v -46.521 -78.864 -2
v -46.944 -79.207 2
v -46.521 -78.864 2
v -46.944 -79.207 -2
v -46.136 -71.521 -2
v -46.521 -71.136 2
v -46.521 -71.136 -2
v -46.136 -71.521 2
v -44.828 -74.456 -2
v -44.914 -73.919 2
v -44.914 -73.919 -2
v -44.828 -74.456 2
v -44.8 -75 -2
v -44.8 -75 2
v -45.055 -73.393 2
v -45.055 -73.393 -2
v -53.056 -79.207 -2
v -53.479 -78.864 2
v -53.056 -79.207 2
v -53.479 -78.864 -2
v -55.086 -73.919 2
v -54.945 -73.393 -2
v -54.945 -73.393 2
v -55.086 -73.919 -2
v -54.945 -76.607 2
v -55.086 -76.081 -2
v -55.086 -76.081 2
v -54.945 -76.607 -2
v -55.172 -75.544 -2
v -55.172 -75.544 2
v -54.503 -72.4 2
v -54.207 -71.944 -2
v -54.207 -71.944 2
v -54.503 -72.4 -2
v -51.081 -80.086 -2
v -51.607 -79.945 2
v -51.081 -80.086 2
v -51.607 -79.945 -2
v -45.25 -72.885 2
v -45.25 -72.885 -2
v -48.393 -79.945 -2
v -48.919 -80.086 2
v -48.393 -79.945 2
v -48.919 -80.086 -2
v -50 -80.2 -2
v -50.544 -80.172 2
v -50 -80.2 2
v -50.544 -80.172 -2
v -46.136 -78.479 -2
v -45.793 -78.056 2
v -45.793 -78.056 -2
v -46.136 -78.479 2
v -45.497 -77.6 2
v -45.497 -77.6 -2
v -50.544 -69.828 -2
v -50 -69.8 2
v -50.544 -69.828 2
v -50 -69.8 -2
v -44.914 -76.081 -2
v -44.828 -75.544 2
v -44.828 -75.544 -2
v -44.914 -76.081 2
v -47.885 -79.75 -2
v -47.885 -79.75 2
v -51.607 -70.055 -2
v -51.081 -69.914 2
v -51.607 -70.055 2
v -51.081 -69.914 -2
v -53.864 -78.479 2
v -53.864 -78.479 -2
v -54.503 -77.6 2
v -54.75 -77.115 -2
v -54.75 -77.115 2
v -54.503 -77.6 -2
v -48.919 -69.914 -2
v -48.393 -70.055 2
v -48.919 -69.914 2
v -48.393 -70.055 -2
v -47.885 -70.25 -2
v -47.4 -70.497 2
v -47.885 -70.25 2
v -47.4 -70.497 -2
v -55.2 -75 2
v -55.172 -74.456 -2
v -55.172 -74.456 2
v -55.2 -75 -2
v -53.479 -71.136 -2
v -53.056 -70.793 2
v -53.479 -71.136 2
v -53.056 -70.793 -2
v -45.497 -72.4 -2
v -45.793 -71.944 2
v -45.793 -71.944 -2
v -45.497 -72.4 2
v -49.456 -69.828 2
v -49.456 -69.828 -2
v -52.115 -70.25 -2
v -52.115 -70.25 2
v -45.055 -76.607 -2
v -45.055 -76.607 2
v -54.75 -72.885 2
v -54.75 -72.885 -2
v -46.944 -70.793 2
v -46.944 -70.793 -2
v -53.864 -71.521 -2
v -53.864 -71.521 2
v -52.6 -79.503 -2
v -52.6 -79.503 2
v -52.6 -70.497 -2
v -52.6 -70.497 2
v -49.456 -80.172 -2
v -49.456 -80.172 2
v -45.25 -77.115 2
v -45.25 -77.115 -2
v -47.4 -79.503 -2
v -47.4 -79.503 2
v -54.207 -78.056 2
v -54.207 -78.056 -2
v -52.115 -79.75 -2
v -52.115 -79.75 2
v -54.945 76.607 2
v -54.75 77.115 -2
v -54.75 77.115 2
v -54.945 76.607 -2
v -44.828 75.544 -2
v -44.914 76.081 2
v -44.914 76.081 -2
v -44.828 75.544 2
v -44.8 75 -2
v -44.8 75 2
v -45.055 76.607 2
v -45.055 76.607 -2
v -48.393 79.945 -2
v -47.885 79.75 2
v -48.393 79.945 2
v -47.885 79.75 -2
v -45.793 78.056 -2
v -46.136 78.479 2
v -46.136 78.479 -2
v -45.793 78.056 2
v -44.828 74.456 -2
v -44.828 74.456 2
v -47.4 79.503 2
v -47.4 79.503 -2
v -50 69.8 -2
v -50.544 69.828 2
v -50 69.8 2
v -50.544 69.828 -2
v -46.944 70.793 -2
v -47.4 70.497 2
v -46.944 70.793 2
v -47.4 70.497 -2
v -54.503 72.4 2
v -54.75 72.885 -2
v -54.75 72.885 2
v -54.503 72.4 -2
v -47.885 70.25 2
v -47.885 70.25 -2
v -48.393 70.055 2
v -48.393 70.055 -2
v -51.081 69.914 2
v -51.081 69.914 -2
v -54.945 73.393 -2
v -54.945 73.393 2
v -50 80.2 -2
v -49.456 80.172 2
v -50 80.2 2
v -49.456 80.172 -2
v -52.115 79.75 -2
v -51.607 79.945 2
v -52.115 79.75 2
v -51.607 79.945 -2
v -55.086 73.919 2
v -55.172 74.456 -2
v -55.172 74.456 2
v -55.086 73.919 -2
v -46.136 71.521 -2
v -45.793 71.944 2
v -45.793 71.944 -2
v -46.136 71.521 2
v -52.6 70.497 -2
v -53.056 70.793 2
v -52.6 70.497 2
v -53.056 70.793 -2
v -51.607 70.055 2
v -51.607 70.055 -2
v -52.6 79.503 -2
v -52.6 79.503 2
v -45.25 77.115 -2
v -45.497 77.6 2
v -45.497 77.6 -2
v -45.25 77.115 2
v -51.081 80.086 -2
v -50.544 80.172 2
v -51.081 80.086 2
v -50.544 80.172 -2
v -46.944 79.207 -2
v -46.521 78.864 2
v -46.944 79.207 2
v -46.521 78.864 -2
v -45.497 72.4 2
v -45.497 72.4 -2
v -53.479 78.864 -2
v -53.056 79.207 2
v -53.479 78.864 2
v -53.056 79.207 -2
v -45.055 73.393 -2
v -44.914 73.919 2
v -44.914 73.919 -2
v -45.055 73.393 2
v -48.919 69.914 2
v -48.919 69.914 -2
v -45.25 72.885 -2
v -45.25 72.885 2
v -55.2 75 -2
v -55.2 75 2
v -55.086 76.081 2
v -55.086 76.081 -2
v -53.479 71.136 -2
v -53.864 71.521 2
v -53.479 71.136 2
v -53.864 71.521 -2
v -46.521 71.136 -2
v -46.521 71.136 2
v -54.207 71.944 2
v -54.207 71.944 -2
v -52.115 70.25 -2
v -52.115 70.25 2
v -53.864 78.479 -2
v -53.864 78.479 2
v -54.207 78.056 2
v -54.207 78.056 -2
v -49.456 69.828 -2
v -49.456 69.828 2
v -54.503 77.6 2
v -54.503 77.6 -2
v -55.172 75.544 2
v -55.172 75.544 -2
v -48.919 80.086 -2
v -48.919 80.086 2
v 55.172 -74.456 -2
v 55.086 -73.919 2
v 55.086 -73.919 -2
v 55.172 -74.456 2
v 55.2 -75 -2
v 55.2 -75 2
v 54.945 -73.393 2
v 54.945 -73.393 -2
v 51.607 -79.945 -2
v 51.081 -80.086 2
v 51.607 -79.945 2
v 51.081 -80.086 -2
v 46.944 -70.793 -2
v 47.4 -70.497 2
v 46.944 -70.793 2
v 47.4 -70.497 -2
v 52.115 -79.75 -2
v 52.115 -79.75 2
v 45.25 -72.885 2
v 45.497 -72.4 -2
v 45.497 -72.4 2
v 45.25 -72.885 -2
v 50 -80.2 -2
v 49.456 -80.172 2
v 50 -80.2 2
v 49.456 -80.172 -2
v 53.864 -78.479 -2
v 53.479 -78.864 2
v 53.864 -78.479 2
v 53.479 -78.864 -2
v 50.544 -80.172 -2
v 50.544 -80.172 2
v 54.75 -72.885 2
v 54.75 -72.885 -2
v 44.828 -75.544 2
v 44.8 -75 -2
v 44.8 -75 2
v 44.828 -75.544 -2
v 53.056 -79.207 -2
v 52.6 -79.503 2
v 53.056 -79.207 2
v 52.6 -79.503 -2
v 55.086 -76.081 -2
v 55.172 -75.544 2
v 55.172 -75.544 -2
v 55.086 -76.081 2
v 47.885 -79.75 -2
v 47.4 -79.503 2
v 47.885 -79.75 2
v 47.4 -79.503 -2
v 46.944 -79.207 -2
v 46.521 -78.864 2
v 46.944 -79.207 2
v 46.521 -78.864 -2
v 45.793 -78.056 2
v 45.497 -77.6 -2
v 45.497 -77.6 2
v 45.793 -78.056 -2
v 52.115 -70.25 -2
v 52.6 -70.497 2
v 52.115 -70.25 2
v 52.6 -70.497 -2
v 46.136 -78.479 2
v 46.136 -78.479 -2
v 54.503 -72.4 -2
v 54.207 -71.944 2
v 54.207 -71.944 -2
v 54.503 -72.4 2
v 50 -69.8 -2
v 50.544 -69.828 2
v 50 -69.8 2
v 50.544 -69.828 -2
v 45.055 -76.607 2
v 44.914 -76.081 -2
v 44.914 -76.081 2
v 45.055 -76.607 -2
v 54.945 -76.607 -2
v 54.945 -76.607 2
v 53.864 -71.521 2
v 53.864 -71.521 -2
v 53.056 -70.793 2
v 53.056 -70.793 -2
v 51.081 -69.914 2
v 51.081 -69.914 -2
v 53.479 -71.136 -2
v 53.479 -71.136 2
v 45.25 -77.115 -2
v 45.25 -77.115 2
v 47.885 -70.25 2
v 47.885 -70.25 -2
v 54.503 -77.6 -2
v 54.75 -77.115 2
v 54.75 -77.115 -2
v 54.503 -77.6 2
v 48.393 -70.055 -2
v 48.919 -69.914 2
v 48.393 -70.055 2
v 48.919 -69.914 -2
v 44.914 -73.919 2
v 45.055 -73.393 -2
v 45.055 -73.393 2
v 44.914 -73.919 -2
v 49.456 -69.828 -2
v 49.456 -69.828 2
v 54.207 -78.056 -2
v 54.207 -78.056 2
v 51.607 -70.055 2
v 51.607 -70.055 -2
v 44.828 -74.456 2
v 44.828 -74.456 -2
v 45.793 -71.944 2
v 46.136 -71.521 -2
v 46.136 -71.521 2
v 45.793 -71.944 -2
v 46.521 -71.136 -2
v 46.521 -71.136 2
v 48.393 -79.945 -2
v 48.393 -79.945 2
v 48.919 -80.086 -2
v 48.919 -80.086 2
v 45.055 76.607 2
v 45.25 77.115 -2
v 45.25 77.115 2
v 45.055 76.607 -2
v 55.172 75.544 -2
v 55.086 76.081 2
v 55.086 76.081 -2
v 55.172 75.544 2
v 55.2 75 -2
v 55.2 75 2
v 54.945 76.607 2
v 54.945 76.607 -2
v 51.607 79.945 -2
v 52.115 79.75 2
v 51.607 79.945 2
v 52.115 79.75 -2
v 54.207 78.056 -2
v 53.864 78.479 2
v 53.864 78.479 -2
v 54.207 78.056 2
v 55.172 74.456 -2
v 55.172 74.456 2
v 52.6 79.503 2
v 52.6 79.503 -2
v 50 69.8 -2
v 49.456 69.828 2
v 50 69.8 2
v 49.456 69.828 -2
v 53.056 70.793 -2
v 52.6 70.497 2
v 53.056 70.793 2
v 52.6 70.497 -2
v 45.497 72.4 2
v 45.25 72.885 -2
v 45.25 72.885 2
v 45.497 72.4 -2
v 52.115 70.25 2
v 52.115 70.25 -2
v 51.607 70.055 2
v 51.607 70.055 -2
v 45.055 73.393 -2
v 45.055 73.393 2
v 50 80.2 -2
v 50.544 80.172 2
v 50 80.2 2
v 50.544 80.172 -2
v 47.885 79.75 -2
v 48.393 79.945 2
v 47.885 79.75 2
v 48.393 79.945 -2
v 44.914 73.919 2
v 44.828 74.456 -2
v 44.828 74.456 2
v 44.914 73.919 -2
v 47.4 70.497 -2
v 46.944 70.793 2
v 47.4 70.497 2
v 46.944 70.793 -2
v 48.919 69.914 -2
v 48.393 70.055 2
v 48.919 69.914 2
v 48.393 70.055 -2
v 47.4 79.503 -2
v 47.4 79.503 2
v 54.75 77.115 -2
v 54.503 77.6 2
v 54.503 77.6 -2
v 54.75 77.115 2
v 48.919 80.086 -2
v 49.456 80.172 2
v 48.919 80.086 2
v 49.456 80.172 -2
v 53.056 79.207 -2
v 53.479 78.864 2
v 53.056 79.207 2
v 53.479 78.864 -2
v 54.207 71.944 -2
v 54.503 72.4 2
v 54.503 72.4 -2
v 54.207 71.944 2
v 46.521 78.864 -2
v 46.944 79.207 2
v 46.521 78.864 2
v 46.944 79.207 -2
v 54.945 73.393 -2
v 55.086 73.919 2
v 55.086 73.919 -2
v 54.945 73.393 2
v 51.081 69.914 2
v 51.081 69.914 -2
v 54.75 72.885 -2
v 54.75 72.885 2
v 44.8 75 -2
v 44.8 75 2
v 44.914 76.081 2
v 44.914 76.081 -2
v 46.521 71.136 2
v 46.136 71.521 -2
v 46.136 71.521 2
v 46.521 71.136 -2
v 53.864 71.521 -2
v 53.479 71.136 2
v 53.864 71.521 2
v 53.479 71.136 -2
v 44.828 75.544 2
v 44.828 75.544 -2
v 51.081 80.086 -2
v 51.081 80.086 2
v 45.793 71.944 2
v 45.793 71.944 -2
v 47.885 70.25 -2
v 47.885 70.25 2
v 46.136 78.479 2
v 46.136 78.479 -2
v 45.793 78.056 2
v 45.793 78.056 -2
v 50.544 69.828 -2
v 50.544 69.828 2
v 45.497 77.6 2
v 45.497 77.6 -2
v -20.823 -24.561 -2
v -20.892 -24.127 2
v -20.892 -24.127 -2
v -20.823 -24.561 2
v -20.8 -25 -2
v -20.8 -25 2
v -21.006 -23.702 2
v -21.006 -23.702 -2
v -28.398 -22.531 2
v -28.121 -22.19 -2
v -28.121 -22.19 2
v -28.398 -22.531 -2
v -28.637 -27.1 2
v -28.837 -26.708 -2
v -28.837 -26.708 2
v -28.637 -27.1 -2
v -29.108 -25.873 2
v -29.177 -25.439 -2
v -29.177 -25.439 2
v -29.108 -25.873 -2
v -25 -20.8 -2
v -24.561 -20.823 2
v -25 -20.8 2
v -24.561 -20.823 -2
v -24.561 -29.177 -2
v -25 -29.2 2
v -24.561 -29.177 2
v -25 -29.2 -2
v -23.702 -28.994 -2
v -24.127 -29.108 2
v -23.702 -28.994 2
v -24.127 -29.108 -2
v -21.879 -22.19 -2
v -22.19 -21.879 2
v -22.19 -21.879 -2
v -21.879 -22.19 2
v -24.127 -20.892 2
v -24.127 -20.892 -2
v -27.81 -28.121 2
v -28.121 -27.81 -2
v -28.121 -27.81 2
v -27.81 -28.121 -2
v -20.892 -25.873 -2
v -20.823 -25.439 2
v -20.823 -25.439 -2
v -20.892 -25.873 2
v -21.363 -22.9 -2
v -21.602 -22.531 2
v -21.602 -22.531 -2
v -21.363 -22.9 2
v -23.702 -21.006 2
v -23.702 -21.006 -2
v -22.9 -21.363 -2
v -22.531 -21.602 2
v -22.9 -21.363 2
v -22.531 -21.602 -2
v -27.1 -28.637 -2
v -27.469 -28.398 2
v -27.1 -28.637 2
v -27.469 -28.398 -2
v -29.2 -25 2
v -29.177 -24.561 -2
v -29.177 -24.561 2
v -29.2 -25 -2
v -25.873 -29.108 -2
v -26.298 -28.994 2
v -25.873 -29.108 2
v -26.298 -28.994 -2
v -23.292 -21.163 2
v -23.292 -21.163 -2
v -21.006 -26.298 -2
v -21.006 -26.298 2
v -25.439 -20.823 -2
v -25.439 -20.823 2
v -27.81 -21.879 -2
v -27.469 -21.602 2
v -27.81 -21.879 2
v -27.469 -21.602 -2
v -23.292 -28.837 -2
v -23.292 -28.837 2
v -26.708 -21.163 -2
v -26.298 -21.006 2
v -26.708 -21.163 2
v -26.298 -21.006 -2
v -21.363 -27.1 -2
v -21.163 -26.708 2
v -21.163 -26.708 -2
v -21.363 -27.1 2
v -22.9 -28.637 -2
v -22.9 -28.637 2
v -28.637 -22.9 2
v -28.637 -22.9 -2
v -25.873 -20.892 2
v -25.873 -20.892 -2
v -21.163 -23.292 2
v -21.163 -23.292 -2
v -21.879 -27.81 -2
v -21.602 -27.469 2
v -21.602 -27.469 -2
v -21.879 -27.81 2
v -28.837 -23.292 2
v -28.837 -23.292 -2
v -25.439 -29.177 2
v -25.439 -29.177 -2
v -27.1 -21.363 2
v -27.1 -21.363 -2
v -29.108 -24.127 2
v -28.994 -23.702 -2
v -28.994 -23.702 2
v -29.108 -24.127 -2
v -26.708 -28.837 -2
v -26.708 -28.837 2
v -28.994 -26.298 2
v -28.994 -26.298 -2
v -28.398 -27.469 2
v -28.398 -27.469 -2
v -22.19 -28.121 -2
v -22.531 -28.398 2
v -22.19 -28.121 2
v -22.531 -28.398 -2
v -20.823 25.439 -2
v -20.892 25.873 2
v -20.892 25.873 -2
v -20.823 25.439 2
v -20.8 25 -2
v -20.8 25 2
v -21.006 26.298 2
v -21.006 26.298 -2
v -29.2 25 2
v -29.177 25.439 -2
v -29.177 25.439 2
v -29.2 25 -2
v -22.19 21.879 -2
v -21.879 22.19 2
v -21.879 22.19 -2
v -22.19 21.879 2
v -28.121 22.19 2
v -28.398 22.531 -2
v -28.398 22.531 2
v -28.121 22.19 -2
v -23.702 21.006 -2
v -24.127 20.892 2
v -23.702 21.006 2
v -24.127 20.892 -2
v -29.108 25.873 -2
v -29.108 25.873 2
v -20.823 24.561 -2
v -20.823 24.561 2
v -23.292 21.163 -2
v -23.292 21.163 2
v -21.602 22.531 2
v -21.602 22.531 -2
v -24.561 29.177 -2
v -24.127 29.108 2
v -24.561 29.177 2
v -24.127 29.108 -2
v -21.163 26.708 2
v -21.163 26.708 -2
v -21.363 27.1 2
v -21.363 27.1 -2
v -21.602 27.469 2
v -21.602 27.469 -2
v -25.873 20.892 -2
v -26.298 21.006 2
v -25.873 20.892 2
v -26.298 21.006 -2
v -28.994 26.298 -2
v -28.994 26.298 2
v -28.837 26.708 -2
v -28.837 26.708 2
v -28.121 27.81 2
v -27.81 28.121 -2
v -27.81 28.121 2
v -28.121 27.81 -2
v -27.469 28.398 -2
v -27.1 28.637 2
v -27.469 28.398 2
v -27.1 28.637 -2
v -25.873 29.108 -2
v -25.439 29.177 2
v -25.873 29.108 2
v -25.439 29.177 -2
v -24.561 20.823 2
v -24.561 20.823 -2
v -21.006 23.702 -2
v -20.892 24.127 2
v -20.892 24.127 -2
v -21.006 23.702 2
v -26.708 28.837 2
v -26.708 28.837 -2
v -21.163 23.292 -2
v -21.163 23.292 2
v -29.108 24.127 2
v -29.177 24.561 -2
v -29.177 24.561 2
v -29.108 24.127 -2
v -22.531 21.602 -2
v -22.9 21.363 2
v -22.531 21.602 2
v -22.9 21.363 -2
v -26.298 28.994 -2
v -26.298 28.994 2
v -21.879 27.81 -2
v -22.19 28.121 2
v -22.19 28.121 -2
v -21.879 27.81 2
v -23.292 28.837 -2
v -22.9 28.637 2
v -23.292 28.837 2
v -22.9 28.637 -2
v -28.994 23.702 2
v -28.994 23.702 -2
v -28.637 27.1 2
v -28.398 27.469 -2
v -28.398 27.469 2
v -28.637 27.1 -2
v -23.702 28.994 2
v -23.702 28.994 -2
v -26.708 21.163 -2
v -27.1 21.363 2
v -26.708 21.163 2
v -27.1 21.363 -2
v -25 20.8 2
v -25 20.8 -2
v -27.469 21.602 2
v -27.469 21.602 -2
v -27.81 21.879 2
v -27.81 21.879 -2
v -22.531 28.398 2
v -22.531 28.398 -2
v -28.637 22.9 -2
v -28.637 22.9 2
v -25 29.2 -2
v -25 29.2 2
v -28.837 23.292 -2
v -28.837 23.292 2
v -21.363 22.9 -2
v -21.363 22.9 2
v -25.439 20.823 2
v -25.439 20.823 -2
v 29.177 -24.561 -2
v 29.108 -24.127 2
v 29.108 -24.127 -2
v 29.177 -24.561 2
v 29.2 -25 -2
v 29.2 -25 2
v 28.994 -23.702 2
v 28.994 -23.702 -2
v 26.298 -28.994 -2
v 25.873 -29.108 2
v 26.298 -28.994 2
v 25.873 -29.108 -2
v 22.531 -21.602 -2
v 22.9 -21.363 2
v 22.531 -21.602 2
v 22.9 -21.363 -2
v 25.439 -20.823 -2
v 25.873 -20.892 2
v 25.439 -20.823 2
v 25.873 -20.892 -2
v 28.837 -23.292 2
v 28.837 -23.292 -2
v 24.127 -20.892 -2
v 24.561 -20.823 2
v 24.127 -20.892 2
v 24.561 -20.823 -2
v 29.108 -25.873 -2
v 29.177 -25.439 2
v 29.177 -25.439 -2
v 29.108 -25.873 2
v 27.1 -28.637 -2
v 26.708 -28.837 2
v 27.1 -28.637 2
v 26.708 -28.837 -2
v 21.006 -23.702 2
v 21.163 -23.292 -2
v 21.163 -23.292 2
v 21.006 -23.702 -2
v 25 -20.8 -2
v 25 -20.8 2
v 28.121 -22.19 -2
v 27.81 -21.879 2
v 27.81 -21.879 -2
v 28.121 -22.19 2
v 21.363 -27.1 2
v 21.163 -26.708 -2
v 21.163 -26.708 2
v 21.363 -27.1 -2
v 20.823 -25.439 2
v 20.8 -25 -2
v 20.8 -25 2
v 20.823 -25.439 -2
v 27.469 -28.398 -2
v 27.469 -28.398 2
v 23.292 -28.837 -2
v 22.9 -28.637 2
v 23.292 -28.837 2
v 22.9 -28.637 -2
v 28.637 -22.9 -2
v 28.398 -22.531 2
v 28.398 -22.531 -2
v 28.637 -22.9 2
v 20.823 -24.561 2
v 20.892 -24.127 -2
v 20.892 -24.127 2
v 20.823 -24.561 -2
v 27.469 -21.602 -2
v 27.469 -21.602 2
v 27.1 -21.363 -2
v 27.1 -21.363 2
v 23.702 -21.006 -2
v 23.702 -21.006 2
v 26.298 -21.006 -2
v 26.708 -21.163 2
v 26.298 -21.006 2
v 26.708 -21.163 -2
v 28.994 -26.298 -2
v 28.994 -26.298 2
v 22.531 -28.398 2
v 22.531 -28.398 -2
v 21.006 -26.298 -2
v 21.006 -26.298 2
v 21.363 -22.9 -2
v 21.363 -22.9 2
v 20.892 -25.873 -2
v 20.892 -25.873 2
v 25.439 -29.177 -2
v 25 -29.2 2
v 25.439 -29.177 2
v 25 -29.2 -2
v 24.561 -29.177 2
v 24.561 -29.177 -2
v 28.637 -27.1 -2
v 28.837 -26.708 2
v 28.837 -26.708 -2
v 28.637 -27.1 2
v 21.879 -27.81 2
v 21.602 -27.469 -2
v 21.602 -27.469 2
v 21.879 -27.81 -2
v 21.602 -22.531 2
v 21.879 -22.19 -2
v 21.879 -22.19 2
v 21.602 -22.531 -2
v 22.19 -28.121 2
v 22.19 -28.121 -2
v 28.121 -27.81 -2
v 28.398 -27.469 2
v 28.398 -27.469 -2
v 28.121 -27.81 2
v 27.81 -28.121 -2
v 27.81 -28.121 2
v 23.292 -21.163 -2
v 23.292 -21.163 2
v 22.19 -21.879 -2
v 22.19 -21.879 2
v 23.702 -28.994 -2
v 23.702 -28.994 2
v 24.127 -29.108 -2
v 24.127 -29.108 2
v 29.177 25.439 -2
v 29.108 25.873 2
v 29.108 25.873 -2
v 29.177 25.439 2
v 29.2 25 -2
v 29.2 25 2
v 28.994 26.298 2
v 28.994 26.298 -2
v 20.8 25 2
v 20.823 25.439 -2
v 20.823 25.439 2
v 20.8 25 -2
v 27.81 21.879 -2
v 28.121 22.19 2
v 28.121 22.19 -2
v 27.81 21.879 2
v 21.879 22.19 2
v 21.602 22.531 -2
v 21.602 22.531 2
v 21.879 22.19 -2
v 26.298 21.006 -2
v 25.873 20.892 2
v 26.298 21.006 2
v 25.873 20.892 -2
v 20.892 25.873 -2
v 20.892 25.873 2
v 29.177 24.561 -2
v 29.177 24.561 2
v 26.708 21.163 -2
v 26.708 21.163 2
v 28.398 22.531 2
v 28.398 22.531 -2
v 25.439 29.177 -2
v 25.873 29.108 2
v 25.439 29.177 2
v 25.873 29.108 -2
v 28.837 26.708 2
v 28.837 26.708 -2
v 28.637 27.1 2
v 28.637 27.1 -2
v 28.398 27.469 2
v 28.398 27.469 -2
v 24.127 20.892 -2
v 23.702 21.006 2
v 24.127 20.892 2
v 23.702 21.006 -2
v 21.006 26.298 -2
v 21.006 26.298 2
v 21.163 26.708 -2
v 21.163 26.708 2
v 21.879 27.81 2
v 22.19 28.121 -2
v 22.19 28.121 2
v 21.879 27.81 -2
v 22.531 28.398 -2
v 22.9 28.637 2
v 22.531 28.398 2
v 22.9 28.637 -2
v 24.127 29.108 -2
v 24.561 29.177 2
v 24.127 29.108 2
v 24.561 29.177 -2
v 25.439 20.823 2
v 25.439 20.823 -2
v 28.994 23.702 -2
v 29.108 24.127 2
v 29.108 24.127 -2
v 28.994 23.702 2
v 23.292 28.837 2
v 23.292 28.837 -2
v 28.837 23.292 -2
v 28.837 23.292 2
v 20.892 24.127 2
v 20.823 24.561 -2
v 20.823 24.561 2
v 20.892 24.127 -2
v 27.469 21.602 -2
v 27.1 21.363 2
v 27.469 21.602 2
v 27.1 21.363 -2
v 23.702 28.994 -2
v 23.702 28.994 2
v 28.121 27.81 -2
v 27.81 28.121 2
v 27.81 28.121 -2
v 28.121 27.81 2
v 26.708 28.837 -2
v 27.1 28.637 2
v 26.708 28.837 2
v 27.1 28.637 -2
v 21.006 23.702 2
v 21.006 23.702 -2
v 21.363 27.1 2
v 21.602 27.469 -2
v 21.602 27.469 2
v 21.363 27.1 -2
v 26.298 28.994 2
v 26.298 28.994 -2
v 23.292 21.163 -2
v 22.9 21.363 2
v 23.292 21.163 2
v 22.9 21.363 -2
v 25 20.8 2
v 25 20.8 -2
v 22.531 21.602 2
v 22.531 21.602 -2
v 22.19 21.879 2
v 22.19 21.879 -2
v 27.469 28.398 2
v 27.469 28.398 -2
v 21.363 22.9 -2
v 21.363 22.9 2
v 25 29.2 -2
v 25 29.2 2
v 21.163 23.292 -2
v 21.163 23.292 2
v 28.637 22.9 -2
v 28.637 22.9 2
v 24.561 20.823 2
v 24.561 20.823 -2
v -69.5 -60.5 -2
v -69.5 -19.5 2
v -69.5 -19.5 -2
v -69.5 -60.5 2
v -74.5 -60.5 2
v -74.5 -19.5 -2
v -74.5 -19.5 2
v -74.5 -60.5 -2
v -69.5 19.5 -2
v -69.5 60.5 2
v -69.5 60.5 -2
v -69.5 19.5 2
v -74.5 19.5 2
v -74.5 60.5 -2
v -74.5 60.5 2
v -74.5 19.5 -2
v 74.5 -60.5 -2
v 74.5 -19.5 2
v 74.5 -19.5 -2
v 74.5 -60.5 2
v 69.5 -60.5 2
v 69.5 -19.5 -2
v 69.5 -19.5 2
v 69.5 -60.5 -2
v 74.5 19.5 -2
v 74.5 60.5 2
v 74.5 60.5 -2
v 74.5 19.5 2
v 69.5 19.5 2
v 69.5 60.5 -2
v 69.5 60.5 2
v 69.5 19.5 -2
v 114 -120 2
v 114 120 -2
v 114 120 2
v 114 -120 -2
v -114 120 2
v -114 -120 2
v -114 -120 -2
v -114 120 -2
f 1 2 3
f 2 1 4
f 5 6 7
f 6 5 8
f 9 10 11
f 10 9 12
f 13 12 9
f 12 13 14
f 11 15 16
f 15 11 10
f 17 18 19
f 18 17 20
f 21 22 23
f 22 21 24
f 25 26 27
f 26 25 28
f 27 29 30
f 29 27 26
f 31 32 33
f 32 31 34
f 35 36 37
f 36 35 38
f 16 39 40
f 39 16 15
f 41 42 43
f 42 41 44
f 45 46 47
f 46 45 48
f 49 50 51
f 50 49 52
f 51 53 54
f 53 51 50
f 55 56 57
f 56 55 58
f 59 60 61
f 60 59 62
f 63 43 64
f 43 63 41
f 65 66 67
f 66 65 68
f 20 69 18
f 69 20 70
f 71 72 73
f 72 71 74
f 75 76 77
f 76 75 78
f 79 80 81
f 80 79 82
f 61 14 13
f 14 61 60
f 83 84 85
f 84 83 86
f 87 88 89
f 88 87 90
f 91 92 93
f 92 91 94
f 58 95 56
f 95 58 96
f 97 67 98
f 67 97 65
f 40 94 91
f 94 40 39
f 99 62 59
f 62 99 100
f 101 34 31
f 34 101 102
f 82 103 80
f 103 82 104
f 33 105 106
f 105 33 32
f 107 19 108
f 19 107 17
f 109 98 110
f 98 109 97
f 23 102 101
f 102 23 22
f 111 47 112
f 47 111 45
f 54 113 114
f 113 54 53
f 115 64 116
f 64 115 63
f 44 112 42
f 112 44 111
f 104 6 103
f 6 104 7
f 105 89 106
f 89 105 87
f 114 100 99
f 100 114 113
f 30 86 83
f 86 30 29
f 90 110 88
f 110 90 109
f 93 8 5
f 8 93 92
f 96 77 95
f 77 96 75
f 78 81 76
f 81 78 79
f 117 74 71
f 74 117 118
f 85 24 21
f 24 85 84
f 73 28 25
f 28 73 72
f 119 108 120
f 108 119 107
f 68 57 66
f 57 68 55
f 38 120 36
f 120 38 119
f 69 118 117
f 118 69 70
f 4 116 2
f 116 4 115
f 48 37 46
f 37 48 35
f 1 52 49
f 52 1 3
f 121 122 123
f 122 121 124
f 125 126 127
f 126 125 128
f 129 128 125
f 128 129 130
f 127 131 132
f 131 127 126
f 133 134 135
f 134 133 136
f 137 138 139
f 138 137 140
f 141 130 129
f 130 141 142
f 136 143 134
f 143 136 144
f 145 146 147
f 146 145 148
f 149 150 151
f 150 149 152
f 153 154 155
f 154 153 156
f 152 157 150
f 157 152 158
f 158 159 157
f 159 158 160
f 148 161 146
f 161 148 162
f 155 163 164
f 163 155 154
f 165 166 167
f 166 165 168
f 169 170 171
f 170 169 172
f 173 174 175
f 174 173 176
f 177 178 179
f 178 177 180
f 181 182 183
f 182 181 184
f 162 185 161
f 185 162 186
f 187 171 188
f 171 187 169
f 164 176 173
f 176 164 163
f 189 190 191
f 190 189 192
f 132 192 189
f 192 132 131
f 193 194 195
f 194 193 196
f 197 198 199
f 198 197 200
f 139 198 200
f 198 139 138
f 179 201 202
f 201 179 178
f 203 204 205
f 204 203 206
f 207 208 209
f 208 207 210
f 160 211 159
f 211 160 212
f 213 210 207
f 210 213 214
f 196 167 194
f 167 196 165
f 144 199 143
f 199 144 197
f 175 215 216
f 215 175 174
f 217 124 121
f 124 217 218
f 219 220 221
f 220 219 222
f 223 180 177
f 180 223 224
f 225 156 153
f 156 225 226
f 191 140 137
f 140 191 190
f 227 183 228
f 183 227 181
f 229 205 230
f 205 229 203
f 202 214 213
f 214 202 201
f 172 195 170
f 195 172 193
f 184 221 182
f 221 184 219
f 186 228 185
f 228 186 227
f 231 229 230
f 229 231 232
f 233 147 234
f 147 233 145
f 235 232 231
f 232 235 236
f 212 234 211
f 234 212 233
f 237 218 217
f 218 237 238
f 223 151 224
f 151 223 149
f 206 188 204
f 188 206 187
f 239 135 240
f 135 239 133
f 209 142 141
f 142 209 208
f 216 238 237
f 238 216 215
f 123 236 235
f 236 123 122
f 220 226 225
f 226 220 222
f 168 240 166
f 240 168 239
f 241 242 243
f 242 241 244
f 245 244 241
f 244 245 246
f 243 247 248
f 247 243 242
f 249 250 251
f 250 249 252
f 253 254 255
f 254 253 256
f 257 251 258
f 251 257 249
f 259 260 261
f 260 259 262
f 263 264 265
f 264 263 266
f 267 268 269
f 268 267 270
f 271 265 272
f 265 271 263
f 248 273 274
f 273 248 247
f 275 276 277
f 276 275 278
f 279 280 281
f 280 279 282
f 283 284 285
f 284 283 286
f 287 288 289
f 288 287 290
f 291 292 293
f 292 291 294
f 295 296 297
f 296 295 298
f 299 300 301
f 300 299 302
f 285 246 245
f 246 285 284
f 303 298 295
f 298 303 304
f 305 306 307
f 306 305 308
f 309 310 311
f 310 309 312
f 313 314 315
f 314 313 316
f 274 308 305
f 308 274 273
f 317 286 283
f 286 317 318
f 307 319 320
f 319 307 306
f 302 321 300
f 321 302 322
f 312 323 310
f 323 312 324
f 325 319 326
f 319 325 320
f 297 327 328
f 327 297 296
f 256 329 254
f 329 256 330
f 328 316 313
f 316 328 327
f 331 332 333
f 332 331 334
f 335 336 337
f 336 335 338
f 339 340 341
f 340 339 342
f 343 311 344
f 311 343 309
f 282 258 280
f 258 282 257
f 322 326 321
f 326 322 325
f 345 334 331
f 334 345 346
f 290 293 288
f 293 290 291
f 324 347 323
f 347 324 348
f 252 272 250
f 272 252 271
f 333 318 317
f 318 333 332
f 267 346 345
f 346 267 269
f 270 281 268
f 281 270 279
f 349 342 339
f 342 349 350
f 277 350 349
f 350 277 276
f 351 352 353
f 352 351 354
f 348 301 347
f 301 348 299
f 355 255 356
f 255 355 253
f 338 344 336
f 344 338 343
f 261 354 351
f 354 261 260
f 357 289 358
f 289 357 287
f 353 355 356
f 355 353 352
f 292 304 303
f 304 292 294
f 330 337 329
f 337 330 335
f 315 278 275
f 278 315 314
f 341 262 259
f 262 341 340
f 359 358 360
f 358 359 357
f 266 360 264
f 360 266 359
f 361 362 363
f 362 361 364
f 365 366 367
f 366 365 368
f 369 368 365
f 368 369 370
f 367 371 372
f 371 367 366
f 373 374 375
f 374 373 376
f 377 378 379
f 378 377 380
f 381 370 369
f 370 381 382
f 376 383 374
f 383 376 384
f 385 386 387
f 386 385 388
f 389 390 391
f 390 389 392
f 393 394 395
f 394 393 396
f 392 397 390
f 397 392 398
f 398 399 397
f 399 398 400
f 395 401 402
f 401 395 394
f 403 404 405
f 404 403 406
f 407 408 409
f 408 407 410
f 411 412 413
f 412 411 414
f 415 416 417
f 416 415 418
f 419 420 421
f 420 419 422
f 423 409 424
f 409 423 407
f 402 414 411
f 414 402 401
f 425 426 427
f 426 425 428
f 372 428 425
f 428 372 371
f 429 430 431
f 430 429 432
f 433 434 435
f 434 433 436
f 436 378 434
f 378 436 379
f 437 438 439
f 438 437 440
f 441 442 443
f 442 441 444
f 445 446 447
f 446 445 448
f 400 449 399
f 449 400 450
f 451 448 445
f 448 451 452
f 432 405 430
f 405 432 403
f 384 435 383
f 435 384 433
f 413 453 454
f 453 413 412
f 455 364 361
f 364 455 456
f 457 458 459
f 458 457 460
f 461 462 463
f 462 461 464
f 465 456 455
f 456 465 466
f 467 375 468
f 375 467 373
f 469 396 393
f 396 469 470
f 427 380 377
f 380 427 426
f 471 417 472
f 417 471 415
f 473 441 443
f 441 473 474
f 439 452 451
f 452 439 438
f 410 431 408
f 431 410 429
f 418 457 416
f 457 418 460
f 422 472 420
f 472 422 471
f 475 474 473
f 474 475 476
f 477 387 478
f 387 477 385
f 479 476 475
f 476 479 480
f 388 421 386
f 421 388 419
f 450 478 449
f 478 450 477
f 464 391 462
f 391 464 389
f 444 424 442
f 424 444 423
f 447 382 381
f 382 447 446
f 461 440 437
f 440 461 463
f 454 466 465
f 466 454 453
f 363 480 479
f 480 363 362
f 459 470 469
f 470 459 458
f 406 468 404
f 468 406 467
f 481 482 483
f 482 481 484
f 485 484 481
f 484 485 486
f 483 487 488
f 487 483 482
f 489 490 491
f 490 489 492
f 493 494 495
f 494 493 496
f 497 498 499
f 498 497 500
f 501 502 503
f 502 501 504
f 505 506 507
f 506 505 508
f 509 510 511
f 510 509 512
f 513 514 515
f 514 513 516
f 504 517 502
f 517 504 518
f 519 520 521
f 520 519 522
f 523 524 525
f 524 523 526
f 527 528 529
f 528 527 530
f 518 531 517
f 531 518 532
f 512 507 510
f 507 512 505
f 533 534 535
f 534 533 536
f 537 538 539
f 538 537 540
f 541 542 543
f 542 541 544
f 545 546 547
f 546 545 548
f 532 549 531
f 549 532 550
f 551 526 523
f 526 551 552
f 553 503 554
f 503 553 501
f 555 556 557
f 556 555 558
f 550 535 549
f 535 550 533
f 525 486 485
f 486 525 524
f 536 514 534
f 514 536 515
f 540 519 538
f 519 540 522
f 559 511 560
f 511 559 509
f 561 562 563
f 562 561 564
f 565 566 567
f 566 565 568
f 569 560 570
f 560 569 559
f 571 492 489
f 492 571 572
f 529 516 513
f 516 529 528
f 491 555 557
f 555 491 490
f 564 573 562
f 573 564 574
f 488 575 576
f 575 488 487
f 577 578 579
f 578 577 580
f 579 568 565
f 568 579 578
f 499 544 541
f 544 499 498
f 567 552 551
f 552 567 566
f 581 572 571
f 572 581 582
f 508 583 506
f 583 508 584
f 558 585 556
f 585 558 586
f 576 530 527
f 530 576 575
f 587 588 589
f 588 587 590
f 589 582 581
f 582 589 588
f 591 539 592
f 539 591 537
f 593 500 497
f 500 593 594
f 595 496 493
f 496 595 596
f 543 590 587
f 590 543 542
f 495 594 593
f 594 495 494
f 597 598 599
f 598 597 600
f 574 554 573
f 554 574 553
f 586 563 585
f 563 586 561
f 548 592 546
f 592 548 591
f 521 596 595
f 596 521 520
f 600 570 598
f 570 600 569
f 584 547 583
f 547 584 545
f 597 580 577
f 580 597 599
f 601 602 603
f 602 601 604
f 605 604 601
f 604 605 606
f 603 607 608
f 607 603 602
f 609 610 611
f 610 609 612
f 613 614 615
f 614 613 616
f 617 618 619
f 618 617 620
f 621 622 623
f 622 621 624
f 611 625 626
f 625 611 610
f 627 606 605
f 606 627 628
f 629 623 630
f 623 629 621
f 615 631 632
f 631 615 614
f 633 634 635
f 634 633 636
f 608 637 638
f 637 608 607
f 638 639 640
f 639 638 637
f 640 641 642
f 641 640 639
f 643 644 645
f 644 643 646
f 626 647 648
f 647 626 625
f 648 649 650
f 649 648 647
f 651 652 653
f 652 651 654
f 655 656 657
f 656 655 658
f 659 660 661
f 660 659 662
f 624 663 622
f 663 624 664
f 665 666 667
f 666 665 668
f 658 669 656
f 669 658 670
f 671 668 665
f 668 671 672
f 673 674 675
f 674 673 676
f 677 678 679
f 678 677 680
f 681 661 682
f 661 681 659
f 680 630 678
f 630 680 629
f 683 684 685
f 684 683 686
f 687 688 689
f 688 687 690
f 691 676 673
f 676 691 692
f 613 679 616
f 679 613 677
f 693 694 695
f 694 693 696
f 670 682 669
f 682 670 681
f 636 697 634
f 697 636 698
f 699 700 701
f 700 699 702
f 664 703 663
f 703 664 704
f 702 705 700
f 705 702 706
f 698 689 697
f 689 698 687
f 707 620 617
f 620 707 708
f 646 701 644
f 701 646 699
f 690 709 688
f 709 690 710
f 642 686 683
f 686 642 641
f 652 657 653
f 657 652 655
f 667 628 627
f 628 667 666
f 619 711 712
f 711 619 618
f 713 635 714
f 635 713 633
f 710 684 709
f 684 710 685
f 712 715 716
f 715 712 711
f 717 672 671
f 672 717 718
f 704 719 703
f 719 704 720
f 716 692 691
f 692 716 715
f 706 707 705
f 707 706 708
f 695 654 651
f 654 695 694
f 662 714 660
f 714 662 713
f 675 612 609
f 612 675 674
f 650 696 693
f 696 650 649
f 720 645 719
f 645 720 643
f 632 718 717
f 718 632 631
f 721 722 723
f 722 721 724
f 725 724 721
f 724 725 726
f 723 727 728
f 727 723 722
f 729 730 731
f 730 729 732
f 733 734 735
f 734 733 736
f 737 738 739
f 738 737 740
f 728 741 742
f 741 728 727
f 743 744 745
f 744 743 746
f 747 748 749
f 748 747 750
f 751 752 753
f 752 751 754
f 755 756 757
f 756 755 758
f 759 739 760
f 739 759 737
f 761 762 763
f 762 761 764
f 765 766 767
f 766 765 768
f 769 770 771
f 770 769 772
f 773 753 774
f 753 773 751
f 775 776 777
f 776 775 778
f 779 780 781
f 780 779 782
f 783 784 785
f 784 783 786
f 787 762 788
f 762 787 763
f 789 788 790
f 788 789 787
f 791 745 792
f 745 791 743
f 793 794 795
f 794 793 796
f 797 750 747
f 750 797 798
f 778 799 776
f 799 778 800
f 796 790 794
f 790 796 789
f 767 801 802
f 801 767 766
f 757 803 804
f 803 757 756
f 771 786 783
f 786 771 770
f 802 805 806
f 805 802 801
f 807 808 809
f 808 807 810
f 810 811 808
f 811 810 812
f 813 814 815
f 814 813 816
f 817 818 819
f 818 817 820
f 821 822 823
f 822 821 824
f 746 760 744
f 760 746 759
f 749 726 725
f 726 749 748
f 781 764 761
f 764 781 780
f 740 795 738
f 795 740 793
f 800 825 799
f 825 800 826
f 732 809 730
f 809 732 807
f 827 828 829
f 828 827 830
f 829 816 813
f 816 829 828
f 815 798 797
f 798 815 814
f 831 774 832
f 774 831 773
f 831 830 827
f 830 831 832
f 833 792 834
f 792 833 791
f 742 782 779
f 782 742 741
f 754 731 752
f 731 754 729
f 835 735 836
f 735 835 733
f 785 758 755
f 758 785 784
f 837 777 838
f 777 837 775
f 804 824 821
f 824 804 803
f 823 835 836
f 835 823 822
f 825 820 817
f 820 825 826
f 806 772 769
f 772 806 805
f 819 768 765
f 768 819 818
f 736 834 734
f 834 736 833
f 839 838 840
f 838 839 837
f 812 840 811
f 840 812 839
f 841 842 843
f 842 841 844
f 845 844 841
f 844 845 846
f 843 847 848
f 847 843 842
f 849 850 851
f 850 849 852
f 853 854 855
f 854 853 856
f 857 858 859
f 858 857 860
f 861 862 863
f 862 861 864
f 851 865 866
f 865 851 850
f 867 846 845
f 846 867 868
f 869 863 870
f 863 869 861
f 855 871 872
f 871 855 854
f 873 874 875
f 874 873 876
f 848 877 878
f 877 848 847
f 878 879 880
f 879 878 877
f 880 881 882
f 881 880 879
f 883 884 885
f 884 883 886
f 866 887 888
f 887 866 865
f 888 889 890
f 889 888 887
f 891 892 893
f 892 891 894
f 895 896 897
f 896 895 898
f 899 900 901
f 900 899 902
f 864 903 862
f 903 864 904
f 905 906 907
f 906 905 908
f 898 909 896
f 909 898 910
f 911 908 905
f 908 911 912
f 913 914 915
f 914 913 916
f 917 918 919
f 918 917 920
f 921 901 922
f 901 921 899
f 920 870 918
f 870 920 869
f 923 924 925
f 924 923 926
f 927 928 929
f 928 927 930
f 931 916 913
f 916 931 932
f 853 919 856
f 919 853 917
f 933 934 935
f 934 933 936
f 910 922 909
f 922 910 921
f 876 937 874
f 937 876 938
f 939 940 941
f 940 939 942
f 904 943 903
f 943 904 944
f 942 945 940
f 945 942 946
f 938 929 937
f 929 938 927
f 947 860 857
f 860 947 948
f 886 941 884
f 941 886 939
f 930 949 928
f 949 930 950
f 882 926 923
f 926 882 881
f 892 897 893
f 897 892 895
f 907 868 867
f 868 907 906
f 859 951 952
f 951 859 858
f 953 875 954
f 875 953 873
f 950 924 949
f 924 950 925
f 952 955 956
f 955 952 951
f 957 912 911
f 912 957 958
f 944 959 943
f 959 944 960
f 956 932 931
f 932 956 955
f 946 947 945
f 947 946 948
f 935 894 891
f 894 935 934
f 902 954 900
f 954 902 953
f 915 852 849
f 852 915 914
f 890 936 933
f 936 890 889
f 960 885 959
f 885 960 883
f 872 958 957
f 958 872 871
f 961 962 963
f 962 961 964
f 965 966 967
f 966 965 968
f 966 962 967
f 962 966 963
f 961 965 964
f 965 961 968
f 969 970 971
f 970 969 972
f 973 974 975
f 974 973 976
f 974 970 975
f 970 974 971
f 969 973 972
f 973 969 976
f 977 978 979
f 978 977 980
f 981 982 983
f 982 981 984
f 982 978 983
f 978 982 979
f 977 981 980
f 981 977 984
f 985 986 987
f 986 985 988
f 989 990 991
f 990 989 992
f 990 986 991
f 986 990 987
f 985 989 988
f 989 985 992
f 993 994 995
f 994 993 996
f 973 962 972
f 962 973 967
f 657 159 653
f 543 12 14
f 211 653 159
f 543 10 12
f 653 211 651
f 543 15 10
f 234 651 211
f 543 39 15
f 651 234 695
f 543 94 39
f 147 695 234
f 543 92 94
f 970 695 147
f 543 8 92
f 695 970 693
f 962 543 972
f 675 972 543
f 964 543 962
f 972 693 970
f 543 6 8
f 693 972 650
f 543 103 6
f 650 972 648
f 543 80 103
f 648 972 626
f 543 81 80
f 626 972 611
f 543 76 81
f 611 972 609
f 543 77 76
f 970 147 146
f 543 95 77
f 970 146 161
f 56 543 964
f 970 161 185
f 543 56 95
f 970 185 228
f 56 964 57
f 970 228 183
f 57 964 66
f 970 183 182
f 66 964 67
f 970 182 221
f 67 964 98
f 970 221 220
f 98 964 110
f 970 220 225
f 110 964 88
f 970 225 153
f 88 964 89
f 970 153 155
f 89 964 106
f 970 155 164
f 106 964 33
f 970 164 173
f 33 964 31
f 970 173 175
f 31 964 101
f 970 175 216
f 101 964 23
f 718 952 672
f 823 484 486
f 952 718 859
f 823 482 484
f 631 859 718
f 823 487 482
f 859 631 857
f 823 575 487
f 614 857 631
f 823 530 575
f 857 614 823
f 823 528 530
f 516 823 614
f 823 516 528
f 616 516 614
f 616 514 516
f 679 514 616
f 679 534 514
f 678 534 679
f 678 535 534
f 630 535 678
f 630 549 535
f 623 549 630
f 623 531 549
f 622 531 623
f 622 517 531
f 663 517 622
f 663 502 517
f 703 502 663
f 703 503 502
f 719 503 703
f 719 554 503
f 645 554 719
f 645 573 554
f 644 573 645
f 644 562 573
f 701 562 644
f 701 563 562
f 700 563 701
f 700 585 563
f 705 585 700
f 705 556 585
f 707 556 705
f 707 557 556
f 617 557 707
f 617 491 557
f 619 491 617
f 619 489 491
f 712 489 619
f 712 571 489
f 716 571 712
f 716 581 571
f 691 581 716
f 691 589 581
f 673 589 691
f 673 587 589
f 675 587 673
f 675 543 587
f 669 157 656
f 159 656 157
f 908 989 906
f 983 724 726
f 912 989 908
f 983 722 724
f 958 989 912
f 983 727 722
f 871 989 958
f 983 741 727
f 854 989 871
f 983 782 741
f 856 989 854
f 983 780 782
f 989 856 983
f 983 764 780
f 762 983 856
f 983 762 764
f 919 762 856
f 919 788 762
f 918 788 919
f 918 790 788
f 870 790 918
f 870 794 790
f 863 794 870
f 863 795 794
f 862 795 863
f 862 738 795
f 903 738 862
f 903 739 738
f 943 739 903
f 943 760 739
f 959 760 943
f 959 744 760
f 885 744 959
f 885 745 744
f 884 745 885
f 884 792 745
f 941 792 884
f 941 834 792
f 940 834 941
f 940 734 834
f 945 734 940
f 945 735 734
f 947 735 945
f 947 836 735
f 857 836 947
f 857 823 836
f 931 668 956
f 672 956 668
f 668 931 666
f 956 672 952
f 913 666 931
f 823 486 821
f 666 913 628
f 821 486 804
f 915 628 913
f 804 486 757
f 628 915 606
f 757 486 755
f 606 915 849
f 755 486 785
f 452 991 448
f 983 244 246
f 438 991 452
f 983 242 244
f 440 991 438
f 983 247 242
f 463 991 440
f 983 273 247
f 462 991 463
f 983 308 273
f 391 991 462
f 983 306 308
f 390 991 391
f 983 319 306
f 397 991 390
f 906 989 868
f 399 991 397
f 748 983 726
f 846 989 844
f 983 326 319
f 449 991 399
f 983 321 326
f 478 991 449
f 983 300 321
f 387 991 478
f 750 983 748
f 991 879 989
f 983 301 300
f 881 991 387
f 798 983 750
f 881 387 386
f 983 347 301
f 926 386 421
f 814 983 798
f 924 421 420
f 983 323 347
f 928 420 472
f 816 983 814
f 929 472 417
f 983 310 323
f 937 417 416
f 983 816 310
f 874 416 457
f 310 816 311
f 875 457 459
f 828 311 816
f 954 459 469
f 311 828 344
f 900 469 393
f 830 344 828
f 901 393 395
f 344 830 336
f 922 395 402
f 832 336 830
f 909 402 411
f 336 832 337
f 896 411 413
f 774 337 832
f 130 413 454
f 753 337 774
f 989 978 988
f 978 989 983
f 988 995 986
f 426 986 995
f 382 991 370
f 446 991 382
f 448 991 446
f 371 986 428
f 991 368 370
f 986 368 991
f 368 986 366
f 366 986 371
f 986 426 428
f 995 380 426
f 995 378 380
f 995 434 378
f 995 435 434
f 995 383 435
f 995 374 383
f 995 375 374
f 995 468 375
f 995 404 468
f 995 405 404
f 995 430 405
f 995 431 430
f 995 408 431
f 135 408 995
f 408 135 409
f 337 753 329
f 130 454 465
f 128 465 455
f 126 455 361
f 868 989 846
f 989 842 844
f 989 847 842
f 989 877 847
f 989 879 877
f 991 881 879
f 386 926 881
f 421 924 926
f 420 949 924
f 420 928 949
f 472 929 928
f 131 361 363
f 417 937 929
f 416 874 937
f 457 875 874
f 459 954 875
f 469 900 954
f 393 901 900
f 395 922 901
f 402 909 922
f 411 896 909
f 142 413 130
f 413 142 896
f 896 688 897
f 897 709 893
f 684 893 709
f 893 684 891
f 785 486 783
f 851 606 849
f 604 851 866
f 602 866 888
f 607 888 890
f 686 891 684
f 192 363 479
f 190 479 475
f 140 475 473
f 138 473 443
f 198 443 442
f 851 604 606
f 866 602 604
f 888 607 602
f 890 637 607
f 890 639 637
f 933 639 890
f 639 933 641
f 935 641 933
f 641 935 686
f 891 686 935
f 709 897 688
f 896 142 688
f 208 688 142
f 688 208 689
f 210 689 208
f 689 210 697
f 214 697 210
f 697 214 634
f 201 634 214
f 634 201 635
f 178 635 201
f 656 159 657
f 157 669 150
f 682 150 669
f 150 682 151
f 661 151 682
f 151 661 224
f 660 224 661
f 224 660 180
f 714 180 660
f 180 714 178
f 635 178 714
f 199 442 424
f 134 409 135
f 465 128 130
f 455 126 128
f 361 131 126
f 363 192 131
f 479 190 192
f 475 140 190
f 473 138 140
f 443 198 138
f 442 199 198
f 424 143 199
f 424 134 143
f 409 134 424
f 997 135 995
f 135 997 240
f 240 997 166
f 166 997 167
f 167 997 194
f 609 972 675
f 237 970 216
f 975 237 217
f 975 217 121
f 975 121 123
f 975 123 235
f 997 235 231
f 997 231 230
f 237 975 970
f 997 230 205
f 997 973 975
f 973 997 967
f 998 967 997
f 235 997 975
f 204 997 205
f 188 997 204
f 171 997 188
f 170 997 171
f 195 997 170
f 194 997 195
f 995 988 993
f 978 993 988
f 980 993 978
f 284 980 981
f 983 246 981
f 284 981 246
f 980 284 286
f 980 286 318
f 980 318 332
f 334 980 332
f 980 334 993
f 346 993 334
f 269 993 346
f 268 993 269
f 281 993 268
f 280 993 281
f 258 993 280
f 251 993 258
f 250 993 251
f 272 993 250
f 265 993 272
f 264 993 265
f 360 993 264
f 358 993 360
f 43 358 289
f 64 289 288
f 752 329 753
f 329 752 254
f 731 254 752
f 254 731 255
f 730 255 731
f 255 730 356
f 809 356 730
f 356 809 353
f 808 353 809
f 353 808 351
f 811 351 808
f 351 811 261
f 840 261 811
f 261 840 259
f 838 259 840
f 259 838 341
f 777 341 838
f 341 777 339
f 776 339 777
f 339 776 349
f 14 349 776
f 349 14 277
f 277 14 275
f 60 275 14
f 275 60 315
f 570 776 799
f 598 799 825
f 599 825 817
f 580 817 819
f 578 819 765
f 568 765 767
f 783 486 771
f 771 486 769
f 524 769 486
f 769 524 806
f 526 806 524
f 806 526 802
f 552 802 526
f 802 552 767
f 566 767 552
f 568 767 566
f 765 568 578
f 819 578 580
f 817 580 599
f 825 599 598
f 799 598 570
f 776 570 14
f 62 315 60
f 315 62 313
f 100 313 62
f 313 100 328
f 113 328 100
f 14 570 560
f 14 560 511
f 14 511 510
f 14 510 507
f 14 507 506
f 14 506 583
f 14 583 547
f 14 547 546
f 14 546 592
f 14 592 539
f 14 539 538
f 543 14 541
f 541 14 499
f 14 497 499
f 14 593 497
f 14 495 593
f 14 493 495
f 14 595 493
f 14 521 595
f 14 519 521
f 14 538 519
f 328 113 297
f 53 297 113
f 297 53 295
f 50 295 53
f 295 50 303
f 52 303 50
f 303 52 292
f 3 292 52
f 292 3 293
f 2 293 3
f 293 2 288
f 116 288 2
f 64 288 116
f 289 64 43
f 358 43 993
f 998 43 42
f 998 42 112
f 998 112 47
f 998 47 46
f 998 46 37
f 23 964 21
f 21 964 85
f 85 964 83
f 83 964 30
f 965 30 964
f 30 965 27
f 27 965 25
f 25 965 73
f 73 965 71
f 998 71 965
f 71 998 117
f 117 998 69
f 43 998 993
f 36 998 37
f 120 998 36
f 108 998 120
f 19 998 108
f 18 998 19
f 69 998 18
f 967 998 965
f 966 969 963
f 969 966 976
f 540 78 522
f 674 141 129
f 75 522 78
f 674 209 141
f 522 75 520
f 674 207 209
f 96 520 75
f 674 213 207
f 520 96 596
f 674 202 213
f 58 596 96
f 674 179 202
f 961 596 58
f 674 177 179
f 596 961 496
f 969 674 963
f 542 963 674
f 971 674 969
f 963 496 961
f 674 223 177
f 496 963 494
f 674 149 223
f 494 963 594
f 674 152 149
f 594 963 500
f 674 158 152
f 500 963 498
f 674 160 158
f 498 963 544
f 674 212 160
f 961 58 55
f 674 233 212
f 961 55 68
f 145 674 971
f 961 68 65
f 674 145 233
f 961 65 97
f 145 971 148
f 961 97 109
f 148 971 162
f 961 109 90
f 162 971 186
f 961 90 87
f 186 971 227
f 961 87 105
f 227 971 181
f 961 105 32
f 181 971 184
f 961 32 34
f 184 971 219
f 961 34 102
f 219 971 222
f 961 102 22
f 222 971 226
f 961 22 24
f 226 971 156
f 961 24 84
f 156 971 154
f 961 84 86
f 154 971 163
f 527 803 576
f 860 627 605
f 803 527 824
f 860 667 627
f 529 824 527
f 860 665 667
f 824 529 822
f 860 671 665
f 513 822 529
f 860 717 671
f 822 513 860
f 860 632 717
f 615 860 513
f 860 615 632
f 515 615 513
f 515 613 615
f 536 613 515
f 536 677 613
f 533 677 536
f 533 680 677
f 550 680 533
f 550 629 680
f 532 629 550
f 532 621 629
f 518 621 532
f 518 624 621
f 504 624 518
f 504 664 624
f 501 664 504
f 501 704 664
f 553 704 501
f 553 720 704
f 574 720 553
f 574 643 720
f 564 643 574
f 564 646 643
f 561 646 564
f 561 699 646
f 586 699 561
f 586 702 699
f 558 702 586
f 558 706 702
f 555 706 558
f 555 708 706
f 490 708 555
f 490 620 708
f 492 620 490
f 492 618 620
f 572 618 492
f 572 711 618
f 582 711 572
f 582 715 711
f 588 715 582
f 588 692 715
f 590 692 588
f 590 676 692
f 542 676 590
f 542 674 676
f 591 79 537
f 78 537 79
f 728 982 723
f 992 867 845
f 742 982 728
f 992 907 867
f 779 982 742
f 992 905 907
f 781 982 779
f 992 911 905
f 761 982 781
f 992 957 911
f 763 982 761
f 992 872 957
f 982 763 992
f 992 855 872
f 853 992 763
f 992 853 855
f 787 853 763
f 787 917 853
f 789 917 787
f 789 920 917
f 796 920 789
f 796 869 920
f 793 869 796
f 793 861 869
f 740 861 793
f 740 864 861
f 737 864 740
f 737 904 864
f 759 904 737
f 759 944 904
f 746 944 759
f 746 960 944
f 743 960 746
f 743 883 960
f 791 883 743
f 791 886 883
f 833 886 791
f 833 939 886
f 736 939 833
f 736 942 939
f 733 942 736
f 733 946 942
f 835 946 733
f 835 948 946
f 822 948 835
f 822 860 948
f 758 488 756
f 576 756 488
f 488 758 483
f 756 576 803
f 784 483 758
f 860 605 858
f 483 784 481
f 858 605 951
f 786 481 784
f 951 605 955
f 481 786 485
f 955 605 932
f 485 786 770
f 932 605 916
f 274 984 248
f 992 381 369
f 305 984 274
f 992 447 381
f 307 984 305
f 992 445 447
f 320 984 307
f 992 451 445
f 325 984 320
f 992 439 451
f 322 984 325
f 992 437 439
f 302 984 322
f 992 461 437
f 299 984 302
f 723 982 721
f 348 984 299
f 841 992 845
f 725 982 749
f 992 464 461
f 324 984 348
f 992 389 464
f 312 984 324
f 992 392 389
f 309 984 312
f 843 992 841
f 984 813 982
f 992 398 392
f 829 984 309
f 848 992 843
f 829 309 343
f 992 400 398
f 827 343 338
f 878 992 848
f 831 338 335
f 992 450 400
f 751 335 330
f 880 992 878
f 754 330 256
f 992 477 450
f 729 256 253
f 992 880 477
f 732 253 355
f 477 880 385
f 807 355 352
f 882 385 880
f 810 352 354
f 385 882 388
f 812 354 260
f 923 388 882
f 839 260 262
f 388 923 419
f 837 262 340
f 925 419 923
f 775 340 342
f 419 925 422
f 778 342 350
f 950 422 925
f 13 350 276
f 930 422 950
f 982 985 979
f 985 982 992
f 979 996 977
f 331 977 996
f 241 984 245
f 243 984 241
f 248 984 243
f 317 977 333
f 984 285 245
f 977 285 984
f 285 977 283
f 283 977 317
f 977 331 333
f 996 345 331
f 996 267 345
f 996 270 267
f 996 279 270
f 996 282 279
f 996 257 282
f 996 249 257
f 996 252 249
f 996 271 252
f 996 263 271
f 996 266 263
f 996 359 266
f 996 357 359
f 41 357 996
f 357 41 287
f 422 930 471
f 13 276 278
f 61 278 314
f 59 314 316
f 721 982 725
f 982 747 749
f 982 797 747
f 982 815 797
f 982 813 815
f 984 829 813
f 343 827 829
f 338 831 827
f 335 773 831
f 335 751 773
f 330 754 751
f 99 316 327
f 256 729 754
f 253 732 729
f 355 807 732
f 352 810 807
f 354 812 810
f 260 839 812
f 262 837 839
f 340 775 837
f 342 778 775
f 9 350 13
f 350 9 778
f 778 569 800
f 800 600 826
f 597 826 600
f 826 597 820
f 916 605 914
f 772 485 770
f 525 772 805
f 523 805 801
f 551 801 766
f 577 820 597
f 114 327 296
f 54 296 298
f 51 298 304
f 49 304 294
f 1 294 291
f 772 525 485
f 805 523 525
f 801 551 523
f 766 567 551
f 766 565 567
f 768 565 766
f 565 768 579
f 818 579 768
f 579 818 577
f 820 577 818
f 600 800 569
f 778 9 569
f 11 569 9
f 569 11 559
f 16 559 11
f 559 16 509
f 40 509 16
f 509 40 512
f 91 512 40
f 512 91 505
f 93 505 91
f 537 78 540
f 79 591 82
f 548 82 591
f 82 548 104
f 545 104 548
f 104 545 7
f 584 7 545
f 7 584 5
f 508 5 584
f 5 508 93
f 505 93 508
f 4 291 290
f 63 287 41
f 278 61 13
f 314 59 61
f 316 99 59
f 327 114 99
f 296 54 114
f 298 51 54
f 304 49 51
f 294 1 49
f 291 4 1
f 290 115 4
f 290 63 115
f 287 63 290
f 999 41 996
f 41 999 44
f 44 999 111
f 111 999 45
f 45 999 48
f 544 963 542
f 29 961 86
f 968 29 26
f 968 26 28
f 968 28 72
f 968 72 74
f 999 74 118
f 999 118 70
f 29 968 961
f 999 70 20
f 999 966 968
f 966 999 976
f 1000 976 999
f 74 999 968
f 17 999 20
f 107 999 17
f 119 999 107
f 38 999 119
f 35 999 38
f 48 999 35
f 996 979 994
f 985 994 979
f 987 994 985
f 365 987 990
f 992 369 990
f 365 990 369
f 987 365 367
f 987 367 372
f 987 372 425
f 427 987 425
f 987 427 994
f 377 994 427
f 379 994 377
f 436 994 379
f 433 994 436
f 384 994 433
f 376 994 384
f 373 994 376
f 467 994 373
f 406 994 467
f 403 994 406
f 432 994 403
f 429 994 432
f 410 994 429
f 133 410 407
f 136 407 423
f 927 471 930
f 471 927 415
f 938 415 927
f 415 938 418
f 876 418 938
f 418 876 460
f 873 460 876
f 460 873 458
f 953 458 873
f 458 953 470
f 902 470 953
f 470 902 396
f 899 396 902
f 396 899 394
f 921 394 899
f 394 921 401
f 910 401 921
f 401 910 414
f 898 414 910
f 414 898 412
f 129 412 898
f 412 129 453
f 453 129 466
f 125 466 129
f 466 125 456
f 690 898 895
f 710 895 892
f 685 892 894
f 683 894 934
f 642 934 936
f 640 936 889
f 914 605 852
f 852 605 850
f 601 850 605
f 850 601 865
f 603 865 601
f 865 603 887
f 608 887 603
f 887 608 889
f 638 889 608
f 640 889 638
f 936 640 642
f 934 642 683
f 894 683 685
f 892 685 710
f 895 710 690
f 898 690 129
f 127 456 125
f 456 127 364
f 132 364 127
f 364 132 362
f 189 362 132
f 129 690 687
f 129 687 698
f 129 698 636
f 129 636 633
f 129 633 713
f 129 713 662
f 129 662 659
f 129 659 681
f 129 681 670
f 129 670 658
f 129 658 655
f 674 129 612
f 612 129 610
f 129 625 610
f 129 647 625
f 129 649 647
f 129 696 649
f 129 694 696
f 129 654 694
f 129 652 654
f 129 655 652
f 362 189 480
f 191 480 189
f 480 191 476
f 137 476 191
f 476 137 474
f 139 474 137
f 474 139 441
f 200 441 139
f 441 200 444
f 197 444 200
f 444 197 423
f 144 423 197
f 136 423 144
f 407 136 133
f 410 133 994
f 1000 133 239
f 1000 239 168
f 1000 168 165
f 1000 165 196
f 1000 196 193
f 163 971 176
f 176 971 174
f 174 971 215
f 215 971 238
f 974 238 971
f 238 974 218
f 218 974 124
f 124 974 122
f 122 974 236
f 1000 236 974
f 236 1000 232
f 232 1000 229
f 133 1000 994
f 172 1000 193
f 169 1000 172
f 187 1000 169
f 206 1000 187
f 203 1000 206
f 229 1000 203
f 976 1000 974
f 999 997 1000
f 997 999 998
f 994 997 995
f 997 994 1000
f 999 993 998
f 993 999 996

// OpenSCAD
// file: ../config/parameters.scad
// Global Chassis Dimensions
chassis_width = 750; //kies een veelvoud van 50  
chassis_length = 1000; //kies een veelvoud van 50

// --- Modulair Gatenpatroon (Grid) ---
grid_step = 50; // Universele stapgrootte voor alle gaten

// --- Bereiken (Ranges) voor de Robot Afmetingen ---
// Bereik voor de BREEDTE 
chassis_width_min = 550;
chassis_width_max = 850;

// Bereik voor de LENGTE 
chassis_length_min = 700;
chassis_length_max = 1100;

// Bereik voor de BASE PLATE 
base_length_min = 800;
base_length_max = 1300;

// Beam Profile (Purchased Part)
beam_profile = 40;
beam_thickness = 2;    
beam_length_1 = 1000;
beam_length_2 = 1300;

// Upright & Cover
base_plate_length = 1300;
connect_plate_thick = 5; 
upright_height = 500;
top_side_width = 60;
cover_thick = 5;
cover_clearance = 10;  
cover_overlap = 10;
cover_total_height = 530; 
hole_distance_cover = 30;

// Resolution & Preview
$fn = 60; 
exploded_view = false; 
explosion_dist = 800; 

// Motor & Wheel Data
tire_dia = 430;
tire_width = 100;
hub_dia = 160;
hub_width = 140; //specs from Quinder are: Fork width for mounting: 138mm
axle_dia = 10.2; //specs from Quinder are: Mounting hole: max 10.2mm
bolt_dia = 14.2;

// Bracket Geometry universal
bracket_thick = 4;
bracket_bolt_diameter = 10.4; //dikte van de gaten van gaten van de wiel_bracket  
bracket_m8_bolt_diameter = 8.4; //dikte van de gaten van m8 bout  
tire_clearance = 130;      
side_plate_top_width = 240;
side_plate_width = 240;

//Side plate
axle_bottom_dist = 35;
extra_space_bracket = 40;
side_hole_start_from_bottom = 20; 
side_hole_pitch = 100; 

tab_length = 40;         // Lengte van de nok/sleuf
tab_offset_y = 40;       // Positie vanaf het midden over de Y-as (uit elkaar)
laser_tolerance = 1.0;   // Extra snijspeling zodat het makkelijk in elkaar schuift

//top plate
bracket_top_hole_dist_x = 100; // De totale gewenste afstand over de X-as veelvoud van 50 maken
bracket_top_hole_dist_y = 150; // De totale gewenste afstand over de Y-as veelvoud van 50 maken
bracket_top_hole_distance_centrum_holes = 50; //De afstand van centrum gat tot centrum gat in het hart

arm_height = (tire_dia / 2) + tire_clearance;
inner_width = hub_width;
bracket_total_width = inner_width + (extra_space_bracket*2) + (2 * bracket_thick);
bracket_top_z = arm_height + bracket_thick;

// Axle bracket
axle_hex_width = 110;          
axle_hex_height = 40;
axle_hex_straight_part = 30;   
axle_bracket_thickness = 4;    

axle_hole_diameter = 10.3; //Dikte van het gaten in de axle_bracket
axle_hole_distance = 40; //hoogte vanaf de onderkant tot de wiel ophanging

axle_flat_width = axle_dia; // Gebruikt 10.2 uit parameters 
axle_round_dia = bolt_dia;  // Gebruikt 14.2 uit parameters

// --- Caster Wheel Parameters ---  
bracket_width            = 80;  
bracket_thickness        = 4;
caster_wheel_axle_width  = 130;   
caster_wheel_axle_diameter = 20;
bracket_axle_hole_diameter = 10.4;

pivot_cylinder_dia       = 30;  
pivot_cylinder_height    = 100;  

outer_cylinder_thickness = 5;   
outer_cylinder_height    = 60;  
outer_cylinder_z_offset  = 33;   
kap_speling              = 1;   

tube_width               = 35;  
tube_thickness           = 2;   
tube_length              = 400;
tube_length_min          = 240;
// main file
include <../config/parameters.scad>

export_als_dxf = false;
if (export_als_dxf) {
    // 2D DXF weergave
    projection(cut = false) 
            bracket_top_plate();
} else {
    // 3D weergave
    bracket_top_plate();
}

module bracket_top_plate() {
    difference() {
        // Basisplaat
        cube([bracket_total_width, side_plate_top_width, bracket_thick], center=true);

        // Bestaande Bevestigingsgaten (voor montage aan frame)
        for(x = [-1, 1], y = [-1, 1]) {
            translate([x * (bracket_top_hole_dist_x / 2), y * (bracket_top_hole_dist_y / 2), 0])
                cylinder(d=bracket_bolt_diameter, h=bracket_thick + 10, center=true);
        }

        // NIEUW: 4 Centrale gaten in vierkant patroon (50 mm hart-op-hart)
        for (x = [-1, 1], y = [-1, 1]) {
            translate([x * (bracket_top_hole_distance_centrum_holes / 2), y * (bracket_top_hole_distance_centrum_holes / 2), 0])
                cylinder(d=bracket_m8_bolt_diameter, h=bracket_thick + 10, center=true);
        }

        // Sleuven voor de zijplaten
        // X-positie is gebaseerd op inner_width (exact waar de side_plates zitten)
        for (x = [-1, 1], y = [-1, 1]) {
            translate([x * (inner_width / 2 + bracket_thick / 2), y * tab_offset_y, 0])
                cube([bracket_thick + laser_tolerance, tab_length + laser_tolerance, bracket_thick + 10], center=true);
        }
    }
}
